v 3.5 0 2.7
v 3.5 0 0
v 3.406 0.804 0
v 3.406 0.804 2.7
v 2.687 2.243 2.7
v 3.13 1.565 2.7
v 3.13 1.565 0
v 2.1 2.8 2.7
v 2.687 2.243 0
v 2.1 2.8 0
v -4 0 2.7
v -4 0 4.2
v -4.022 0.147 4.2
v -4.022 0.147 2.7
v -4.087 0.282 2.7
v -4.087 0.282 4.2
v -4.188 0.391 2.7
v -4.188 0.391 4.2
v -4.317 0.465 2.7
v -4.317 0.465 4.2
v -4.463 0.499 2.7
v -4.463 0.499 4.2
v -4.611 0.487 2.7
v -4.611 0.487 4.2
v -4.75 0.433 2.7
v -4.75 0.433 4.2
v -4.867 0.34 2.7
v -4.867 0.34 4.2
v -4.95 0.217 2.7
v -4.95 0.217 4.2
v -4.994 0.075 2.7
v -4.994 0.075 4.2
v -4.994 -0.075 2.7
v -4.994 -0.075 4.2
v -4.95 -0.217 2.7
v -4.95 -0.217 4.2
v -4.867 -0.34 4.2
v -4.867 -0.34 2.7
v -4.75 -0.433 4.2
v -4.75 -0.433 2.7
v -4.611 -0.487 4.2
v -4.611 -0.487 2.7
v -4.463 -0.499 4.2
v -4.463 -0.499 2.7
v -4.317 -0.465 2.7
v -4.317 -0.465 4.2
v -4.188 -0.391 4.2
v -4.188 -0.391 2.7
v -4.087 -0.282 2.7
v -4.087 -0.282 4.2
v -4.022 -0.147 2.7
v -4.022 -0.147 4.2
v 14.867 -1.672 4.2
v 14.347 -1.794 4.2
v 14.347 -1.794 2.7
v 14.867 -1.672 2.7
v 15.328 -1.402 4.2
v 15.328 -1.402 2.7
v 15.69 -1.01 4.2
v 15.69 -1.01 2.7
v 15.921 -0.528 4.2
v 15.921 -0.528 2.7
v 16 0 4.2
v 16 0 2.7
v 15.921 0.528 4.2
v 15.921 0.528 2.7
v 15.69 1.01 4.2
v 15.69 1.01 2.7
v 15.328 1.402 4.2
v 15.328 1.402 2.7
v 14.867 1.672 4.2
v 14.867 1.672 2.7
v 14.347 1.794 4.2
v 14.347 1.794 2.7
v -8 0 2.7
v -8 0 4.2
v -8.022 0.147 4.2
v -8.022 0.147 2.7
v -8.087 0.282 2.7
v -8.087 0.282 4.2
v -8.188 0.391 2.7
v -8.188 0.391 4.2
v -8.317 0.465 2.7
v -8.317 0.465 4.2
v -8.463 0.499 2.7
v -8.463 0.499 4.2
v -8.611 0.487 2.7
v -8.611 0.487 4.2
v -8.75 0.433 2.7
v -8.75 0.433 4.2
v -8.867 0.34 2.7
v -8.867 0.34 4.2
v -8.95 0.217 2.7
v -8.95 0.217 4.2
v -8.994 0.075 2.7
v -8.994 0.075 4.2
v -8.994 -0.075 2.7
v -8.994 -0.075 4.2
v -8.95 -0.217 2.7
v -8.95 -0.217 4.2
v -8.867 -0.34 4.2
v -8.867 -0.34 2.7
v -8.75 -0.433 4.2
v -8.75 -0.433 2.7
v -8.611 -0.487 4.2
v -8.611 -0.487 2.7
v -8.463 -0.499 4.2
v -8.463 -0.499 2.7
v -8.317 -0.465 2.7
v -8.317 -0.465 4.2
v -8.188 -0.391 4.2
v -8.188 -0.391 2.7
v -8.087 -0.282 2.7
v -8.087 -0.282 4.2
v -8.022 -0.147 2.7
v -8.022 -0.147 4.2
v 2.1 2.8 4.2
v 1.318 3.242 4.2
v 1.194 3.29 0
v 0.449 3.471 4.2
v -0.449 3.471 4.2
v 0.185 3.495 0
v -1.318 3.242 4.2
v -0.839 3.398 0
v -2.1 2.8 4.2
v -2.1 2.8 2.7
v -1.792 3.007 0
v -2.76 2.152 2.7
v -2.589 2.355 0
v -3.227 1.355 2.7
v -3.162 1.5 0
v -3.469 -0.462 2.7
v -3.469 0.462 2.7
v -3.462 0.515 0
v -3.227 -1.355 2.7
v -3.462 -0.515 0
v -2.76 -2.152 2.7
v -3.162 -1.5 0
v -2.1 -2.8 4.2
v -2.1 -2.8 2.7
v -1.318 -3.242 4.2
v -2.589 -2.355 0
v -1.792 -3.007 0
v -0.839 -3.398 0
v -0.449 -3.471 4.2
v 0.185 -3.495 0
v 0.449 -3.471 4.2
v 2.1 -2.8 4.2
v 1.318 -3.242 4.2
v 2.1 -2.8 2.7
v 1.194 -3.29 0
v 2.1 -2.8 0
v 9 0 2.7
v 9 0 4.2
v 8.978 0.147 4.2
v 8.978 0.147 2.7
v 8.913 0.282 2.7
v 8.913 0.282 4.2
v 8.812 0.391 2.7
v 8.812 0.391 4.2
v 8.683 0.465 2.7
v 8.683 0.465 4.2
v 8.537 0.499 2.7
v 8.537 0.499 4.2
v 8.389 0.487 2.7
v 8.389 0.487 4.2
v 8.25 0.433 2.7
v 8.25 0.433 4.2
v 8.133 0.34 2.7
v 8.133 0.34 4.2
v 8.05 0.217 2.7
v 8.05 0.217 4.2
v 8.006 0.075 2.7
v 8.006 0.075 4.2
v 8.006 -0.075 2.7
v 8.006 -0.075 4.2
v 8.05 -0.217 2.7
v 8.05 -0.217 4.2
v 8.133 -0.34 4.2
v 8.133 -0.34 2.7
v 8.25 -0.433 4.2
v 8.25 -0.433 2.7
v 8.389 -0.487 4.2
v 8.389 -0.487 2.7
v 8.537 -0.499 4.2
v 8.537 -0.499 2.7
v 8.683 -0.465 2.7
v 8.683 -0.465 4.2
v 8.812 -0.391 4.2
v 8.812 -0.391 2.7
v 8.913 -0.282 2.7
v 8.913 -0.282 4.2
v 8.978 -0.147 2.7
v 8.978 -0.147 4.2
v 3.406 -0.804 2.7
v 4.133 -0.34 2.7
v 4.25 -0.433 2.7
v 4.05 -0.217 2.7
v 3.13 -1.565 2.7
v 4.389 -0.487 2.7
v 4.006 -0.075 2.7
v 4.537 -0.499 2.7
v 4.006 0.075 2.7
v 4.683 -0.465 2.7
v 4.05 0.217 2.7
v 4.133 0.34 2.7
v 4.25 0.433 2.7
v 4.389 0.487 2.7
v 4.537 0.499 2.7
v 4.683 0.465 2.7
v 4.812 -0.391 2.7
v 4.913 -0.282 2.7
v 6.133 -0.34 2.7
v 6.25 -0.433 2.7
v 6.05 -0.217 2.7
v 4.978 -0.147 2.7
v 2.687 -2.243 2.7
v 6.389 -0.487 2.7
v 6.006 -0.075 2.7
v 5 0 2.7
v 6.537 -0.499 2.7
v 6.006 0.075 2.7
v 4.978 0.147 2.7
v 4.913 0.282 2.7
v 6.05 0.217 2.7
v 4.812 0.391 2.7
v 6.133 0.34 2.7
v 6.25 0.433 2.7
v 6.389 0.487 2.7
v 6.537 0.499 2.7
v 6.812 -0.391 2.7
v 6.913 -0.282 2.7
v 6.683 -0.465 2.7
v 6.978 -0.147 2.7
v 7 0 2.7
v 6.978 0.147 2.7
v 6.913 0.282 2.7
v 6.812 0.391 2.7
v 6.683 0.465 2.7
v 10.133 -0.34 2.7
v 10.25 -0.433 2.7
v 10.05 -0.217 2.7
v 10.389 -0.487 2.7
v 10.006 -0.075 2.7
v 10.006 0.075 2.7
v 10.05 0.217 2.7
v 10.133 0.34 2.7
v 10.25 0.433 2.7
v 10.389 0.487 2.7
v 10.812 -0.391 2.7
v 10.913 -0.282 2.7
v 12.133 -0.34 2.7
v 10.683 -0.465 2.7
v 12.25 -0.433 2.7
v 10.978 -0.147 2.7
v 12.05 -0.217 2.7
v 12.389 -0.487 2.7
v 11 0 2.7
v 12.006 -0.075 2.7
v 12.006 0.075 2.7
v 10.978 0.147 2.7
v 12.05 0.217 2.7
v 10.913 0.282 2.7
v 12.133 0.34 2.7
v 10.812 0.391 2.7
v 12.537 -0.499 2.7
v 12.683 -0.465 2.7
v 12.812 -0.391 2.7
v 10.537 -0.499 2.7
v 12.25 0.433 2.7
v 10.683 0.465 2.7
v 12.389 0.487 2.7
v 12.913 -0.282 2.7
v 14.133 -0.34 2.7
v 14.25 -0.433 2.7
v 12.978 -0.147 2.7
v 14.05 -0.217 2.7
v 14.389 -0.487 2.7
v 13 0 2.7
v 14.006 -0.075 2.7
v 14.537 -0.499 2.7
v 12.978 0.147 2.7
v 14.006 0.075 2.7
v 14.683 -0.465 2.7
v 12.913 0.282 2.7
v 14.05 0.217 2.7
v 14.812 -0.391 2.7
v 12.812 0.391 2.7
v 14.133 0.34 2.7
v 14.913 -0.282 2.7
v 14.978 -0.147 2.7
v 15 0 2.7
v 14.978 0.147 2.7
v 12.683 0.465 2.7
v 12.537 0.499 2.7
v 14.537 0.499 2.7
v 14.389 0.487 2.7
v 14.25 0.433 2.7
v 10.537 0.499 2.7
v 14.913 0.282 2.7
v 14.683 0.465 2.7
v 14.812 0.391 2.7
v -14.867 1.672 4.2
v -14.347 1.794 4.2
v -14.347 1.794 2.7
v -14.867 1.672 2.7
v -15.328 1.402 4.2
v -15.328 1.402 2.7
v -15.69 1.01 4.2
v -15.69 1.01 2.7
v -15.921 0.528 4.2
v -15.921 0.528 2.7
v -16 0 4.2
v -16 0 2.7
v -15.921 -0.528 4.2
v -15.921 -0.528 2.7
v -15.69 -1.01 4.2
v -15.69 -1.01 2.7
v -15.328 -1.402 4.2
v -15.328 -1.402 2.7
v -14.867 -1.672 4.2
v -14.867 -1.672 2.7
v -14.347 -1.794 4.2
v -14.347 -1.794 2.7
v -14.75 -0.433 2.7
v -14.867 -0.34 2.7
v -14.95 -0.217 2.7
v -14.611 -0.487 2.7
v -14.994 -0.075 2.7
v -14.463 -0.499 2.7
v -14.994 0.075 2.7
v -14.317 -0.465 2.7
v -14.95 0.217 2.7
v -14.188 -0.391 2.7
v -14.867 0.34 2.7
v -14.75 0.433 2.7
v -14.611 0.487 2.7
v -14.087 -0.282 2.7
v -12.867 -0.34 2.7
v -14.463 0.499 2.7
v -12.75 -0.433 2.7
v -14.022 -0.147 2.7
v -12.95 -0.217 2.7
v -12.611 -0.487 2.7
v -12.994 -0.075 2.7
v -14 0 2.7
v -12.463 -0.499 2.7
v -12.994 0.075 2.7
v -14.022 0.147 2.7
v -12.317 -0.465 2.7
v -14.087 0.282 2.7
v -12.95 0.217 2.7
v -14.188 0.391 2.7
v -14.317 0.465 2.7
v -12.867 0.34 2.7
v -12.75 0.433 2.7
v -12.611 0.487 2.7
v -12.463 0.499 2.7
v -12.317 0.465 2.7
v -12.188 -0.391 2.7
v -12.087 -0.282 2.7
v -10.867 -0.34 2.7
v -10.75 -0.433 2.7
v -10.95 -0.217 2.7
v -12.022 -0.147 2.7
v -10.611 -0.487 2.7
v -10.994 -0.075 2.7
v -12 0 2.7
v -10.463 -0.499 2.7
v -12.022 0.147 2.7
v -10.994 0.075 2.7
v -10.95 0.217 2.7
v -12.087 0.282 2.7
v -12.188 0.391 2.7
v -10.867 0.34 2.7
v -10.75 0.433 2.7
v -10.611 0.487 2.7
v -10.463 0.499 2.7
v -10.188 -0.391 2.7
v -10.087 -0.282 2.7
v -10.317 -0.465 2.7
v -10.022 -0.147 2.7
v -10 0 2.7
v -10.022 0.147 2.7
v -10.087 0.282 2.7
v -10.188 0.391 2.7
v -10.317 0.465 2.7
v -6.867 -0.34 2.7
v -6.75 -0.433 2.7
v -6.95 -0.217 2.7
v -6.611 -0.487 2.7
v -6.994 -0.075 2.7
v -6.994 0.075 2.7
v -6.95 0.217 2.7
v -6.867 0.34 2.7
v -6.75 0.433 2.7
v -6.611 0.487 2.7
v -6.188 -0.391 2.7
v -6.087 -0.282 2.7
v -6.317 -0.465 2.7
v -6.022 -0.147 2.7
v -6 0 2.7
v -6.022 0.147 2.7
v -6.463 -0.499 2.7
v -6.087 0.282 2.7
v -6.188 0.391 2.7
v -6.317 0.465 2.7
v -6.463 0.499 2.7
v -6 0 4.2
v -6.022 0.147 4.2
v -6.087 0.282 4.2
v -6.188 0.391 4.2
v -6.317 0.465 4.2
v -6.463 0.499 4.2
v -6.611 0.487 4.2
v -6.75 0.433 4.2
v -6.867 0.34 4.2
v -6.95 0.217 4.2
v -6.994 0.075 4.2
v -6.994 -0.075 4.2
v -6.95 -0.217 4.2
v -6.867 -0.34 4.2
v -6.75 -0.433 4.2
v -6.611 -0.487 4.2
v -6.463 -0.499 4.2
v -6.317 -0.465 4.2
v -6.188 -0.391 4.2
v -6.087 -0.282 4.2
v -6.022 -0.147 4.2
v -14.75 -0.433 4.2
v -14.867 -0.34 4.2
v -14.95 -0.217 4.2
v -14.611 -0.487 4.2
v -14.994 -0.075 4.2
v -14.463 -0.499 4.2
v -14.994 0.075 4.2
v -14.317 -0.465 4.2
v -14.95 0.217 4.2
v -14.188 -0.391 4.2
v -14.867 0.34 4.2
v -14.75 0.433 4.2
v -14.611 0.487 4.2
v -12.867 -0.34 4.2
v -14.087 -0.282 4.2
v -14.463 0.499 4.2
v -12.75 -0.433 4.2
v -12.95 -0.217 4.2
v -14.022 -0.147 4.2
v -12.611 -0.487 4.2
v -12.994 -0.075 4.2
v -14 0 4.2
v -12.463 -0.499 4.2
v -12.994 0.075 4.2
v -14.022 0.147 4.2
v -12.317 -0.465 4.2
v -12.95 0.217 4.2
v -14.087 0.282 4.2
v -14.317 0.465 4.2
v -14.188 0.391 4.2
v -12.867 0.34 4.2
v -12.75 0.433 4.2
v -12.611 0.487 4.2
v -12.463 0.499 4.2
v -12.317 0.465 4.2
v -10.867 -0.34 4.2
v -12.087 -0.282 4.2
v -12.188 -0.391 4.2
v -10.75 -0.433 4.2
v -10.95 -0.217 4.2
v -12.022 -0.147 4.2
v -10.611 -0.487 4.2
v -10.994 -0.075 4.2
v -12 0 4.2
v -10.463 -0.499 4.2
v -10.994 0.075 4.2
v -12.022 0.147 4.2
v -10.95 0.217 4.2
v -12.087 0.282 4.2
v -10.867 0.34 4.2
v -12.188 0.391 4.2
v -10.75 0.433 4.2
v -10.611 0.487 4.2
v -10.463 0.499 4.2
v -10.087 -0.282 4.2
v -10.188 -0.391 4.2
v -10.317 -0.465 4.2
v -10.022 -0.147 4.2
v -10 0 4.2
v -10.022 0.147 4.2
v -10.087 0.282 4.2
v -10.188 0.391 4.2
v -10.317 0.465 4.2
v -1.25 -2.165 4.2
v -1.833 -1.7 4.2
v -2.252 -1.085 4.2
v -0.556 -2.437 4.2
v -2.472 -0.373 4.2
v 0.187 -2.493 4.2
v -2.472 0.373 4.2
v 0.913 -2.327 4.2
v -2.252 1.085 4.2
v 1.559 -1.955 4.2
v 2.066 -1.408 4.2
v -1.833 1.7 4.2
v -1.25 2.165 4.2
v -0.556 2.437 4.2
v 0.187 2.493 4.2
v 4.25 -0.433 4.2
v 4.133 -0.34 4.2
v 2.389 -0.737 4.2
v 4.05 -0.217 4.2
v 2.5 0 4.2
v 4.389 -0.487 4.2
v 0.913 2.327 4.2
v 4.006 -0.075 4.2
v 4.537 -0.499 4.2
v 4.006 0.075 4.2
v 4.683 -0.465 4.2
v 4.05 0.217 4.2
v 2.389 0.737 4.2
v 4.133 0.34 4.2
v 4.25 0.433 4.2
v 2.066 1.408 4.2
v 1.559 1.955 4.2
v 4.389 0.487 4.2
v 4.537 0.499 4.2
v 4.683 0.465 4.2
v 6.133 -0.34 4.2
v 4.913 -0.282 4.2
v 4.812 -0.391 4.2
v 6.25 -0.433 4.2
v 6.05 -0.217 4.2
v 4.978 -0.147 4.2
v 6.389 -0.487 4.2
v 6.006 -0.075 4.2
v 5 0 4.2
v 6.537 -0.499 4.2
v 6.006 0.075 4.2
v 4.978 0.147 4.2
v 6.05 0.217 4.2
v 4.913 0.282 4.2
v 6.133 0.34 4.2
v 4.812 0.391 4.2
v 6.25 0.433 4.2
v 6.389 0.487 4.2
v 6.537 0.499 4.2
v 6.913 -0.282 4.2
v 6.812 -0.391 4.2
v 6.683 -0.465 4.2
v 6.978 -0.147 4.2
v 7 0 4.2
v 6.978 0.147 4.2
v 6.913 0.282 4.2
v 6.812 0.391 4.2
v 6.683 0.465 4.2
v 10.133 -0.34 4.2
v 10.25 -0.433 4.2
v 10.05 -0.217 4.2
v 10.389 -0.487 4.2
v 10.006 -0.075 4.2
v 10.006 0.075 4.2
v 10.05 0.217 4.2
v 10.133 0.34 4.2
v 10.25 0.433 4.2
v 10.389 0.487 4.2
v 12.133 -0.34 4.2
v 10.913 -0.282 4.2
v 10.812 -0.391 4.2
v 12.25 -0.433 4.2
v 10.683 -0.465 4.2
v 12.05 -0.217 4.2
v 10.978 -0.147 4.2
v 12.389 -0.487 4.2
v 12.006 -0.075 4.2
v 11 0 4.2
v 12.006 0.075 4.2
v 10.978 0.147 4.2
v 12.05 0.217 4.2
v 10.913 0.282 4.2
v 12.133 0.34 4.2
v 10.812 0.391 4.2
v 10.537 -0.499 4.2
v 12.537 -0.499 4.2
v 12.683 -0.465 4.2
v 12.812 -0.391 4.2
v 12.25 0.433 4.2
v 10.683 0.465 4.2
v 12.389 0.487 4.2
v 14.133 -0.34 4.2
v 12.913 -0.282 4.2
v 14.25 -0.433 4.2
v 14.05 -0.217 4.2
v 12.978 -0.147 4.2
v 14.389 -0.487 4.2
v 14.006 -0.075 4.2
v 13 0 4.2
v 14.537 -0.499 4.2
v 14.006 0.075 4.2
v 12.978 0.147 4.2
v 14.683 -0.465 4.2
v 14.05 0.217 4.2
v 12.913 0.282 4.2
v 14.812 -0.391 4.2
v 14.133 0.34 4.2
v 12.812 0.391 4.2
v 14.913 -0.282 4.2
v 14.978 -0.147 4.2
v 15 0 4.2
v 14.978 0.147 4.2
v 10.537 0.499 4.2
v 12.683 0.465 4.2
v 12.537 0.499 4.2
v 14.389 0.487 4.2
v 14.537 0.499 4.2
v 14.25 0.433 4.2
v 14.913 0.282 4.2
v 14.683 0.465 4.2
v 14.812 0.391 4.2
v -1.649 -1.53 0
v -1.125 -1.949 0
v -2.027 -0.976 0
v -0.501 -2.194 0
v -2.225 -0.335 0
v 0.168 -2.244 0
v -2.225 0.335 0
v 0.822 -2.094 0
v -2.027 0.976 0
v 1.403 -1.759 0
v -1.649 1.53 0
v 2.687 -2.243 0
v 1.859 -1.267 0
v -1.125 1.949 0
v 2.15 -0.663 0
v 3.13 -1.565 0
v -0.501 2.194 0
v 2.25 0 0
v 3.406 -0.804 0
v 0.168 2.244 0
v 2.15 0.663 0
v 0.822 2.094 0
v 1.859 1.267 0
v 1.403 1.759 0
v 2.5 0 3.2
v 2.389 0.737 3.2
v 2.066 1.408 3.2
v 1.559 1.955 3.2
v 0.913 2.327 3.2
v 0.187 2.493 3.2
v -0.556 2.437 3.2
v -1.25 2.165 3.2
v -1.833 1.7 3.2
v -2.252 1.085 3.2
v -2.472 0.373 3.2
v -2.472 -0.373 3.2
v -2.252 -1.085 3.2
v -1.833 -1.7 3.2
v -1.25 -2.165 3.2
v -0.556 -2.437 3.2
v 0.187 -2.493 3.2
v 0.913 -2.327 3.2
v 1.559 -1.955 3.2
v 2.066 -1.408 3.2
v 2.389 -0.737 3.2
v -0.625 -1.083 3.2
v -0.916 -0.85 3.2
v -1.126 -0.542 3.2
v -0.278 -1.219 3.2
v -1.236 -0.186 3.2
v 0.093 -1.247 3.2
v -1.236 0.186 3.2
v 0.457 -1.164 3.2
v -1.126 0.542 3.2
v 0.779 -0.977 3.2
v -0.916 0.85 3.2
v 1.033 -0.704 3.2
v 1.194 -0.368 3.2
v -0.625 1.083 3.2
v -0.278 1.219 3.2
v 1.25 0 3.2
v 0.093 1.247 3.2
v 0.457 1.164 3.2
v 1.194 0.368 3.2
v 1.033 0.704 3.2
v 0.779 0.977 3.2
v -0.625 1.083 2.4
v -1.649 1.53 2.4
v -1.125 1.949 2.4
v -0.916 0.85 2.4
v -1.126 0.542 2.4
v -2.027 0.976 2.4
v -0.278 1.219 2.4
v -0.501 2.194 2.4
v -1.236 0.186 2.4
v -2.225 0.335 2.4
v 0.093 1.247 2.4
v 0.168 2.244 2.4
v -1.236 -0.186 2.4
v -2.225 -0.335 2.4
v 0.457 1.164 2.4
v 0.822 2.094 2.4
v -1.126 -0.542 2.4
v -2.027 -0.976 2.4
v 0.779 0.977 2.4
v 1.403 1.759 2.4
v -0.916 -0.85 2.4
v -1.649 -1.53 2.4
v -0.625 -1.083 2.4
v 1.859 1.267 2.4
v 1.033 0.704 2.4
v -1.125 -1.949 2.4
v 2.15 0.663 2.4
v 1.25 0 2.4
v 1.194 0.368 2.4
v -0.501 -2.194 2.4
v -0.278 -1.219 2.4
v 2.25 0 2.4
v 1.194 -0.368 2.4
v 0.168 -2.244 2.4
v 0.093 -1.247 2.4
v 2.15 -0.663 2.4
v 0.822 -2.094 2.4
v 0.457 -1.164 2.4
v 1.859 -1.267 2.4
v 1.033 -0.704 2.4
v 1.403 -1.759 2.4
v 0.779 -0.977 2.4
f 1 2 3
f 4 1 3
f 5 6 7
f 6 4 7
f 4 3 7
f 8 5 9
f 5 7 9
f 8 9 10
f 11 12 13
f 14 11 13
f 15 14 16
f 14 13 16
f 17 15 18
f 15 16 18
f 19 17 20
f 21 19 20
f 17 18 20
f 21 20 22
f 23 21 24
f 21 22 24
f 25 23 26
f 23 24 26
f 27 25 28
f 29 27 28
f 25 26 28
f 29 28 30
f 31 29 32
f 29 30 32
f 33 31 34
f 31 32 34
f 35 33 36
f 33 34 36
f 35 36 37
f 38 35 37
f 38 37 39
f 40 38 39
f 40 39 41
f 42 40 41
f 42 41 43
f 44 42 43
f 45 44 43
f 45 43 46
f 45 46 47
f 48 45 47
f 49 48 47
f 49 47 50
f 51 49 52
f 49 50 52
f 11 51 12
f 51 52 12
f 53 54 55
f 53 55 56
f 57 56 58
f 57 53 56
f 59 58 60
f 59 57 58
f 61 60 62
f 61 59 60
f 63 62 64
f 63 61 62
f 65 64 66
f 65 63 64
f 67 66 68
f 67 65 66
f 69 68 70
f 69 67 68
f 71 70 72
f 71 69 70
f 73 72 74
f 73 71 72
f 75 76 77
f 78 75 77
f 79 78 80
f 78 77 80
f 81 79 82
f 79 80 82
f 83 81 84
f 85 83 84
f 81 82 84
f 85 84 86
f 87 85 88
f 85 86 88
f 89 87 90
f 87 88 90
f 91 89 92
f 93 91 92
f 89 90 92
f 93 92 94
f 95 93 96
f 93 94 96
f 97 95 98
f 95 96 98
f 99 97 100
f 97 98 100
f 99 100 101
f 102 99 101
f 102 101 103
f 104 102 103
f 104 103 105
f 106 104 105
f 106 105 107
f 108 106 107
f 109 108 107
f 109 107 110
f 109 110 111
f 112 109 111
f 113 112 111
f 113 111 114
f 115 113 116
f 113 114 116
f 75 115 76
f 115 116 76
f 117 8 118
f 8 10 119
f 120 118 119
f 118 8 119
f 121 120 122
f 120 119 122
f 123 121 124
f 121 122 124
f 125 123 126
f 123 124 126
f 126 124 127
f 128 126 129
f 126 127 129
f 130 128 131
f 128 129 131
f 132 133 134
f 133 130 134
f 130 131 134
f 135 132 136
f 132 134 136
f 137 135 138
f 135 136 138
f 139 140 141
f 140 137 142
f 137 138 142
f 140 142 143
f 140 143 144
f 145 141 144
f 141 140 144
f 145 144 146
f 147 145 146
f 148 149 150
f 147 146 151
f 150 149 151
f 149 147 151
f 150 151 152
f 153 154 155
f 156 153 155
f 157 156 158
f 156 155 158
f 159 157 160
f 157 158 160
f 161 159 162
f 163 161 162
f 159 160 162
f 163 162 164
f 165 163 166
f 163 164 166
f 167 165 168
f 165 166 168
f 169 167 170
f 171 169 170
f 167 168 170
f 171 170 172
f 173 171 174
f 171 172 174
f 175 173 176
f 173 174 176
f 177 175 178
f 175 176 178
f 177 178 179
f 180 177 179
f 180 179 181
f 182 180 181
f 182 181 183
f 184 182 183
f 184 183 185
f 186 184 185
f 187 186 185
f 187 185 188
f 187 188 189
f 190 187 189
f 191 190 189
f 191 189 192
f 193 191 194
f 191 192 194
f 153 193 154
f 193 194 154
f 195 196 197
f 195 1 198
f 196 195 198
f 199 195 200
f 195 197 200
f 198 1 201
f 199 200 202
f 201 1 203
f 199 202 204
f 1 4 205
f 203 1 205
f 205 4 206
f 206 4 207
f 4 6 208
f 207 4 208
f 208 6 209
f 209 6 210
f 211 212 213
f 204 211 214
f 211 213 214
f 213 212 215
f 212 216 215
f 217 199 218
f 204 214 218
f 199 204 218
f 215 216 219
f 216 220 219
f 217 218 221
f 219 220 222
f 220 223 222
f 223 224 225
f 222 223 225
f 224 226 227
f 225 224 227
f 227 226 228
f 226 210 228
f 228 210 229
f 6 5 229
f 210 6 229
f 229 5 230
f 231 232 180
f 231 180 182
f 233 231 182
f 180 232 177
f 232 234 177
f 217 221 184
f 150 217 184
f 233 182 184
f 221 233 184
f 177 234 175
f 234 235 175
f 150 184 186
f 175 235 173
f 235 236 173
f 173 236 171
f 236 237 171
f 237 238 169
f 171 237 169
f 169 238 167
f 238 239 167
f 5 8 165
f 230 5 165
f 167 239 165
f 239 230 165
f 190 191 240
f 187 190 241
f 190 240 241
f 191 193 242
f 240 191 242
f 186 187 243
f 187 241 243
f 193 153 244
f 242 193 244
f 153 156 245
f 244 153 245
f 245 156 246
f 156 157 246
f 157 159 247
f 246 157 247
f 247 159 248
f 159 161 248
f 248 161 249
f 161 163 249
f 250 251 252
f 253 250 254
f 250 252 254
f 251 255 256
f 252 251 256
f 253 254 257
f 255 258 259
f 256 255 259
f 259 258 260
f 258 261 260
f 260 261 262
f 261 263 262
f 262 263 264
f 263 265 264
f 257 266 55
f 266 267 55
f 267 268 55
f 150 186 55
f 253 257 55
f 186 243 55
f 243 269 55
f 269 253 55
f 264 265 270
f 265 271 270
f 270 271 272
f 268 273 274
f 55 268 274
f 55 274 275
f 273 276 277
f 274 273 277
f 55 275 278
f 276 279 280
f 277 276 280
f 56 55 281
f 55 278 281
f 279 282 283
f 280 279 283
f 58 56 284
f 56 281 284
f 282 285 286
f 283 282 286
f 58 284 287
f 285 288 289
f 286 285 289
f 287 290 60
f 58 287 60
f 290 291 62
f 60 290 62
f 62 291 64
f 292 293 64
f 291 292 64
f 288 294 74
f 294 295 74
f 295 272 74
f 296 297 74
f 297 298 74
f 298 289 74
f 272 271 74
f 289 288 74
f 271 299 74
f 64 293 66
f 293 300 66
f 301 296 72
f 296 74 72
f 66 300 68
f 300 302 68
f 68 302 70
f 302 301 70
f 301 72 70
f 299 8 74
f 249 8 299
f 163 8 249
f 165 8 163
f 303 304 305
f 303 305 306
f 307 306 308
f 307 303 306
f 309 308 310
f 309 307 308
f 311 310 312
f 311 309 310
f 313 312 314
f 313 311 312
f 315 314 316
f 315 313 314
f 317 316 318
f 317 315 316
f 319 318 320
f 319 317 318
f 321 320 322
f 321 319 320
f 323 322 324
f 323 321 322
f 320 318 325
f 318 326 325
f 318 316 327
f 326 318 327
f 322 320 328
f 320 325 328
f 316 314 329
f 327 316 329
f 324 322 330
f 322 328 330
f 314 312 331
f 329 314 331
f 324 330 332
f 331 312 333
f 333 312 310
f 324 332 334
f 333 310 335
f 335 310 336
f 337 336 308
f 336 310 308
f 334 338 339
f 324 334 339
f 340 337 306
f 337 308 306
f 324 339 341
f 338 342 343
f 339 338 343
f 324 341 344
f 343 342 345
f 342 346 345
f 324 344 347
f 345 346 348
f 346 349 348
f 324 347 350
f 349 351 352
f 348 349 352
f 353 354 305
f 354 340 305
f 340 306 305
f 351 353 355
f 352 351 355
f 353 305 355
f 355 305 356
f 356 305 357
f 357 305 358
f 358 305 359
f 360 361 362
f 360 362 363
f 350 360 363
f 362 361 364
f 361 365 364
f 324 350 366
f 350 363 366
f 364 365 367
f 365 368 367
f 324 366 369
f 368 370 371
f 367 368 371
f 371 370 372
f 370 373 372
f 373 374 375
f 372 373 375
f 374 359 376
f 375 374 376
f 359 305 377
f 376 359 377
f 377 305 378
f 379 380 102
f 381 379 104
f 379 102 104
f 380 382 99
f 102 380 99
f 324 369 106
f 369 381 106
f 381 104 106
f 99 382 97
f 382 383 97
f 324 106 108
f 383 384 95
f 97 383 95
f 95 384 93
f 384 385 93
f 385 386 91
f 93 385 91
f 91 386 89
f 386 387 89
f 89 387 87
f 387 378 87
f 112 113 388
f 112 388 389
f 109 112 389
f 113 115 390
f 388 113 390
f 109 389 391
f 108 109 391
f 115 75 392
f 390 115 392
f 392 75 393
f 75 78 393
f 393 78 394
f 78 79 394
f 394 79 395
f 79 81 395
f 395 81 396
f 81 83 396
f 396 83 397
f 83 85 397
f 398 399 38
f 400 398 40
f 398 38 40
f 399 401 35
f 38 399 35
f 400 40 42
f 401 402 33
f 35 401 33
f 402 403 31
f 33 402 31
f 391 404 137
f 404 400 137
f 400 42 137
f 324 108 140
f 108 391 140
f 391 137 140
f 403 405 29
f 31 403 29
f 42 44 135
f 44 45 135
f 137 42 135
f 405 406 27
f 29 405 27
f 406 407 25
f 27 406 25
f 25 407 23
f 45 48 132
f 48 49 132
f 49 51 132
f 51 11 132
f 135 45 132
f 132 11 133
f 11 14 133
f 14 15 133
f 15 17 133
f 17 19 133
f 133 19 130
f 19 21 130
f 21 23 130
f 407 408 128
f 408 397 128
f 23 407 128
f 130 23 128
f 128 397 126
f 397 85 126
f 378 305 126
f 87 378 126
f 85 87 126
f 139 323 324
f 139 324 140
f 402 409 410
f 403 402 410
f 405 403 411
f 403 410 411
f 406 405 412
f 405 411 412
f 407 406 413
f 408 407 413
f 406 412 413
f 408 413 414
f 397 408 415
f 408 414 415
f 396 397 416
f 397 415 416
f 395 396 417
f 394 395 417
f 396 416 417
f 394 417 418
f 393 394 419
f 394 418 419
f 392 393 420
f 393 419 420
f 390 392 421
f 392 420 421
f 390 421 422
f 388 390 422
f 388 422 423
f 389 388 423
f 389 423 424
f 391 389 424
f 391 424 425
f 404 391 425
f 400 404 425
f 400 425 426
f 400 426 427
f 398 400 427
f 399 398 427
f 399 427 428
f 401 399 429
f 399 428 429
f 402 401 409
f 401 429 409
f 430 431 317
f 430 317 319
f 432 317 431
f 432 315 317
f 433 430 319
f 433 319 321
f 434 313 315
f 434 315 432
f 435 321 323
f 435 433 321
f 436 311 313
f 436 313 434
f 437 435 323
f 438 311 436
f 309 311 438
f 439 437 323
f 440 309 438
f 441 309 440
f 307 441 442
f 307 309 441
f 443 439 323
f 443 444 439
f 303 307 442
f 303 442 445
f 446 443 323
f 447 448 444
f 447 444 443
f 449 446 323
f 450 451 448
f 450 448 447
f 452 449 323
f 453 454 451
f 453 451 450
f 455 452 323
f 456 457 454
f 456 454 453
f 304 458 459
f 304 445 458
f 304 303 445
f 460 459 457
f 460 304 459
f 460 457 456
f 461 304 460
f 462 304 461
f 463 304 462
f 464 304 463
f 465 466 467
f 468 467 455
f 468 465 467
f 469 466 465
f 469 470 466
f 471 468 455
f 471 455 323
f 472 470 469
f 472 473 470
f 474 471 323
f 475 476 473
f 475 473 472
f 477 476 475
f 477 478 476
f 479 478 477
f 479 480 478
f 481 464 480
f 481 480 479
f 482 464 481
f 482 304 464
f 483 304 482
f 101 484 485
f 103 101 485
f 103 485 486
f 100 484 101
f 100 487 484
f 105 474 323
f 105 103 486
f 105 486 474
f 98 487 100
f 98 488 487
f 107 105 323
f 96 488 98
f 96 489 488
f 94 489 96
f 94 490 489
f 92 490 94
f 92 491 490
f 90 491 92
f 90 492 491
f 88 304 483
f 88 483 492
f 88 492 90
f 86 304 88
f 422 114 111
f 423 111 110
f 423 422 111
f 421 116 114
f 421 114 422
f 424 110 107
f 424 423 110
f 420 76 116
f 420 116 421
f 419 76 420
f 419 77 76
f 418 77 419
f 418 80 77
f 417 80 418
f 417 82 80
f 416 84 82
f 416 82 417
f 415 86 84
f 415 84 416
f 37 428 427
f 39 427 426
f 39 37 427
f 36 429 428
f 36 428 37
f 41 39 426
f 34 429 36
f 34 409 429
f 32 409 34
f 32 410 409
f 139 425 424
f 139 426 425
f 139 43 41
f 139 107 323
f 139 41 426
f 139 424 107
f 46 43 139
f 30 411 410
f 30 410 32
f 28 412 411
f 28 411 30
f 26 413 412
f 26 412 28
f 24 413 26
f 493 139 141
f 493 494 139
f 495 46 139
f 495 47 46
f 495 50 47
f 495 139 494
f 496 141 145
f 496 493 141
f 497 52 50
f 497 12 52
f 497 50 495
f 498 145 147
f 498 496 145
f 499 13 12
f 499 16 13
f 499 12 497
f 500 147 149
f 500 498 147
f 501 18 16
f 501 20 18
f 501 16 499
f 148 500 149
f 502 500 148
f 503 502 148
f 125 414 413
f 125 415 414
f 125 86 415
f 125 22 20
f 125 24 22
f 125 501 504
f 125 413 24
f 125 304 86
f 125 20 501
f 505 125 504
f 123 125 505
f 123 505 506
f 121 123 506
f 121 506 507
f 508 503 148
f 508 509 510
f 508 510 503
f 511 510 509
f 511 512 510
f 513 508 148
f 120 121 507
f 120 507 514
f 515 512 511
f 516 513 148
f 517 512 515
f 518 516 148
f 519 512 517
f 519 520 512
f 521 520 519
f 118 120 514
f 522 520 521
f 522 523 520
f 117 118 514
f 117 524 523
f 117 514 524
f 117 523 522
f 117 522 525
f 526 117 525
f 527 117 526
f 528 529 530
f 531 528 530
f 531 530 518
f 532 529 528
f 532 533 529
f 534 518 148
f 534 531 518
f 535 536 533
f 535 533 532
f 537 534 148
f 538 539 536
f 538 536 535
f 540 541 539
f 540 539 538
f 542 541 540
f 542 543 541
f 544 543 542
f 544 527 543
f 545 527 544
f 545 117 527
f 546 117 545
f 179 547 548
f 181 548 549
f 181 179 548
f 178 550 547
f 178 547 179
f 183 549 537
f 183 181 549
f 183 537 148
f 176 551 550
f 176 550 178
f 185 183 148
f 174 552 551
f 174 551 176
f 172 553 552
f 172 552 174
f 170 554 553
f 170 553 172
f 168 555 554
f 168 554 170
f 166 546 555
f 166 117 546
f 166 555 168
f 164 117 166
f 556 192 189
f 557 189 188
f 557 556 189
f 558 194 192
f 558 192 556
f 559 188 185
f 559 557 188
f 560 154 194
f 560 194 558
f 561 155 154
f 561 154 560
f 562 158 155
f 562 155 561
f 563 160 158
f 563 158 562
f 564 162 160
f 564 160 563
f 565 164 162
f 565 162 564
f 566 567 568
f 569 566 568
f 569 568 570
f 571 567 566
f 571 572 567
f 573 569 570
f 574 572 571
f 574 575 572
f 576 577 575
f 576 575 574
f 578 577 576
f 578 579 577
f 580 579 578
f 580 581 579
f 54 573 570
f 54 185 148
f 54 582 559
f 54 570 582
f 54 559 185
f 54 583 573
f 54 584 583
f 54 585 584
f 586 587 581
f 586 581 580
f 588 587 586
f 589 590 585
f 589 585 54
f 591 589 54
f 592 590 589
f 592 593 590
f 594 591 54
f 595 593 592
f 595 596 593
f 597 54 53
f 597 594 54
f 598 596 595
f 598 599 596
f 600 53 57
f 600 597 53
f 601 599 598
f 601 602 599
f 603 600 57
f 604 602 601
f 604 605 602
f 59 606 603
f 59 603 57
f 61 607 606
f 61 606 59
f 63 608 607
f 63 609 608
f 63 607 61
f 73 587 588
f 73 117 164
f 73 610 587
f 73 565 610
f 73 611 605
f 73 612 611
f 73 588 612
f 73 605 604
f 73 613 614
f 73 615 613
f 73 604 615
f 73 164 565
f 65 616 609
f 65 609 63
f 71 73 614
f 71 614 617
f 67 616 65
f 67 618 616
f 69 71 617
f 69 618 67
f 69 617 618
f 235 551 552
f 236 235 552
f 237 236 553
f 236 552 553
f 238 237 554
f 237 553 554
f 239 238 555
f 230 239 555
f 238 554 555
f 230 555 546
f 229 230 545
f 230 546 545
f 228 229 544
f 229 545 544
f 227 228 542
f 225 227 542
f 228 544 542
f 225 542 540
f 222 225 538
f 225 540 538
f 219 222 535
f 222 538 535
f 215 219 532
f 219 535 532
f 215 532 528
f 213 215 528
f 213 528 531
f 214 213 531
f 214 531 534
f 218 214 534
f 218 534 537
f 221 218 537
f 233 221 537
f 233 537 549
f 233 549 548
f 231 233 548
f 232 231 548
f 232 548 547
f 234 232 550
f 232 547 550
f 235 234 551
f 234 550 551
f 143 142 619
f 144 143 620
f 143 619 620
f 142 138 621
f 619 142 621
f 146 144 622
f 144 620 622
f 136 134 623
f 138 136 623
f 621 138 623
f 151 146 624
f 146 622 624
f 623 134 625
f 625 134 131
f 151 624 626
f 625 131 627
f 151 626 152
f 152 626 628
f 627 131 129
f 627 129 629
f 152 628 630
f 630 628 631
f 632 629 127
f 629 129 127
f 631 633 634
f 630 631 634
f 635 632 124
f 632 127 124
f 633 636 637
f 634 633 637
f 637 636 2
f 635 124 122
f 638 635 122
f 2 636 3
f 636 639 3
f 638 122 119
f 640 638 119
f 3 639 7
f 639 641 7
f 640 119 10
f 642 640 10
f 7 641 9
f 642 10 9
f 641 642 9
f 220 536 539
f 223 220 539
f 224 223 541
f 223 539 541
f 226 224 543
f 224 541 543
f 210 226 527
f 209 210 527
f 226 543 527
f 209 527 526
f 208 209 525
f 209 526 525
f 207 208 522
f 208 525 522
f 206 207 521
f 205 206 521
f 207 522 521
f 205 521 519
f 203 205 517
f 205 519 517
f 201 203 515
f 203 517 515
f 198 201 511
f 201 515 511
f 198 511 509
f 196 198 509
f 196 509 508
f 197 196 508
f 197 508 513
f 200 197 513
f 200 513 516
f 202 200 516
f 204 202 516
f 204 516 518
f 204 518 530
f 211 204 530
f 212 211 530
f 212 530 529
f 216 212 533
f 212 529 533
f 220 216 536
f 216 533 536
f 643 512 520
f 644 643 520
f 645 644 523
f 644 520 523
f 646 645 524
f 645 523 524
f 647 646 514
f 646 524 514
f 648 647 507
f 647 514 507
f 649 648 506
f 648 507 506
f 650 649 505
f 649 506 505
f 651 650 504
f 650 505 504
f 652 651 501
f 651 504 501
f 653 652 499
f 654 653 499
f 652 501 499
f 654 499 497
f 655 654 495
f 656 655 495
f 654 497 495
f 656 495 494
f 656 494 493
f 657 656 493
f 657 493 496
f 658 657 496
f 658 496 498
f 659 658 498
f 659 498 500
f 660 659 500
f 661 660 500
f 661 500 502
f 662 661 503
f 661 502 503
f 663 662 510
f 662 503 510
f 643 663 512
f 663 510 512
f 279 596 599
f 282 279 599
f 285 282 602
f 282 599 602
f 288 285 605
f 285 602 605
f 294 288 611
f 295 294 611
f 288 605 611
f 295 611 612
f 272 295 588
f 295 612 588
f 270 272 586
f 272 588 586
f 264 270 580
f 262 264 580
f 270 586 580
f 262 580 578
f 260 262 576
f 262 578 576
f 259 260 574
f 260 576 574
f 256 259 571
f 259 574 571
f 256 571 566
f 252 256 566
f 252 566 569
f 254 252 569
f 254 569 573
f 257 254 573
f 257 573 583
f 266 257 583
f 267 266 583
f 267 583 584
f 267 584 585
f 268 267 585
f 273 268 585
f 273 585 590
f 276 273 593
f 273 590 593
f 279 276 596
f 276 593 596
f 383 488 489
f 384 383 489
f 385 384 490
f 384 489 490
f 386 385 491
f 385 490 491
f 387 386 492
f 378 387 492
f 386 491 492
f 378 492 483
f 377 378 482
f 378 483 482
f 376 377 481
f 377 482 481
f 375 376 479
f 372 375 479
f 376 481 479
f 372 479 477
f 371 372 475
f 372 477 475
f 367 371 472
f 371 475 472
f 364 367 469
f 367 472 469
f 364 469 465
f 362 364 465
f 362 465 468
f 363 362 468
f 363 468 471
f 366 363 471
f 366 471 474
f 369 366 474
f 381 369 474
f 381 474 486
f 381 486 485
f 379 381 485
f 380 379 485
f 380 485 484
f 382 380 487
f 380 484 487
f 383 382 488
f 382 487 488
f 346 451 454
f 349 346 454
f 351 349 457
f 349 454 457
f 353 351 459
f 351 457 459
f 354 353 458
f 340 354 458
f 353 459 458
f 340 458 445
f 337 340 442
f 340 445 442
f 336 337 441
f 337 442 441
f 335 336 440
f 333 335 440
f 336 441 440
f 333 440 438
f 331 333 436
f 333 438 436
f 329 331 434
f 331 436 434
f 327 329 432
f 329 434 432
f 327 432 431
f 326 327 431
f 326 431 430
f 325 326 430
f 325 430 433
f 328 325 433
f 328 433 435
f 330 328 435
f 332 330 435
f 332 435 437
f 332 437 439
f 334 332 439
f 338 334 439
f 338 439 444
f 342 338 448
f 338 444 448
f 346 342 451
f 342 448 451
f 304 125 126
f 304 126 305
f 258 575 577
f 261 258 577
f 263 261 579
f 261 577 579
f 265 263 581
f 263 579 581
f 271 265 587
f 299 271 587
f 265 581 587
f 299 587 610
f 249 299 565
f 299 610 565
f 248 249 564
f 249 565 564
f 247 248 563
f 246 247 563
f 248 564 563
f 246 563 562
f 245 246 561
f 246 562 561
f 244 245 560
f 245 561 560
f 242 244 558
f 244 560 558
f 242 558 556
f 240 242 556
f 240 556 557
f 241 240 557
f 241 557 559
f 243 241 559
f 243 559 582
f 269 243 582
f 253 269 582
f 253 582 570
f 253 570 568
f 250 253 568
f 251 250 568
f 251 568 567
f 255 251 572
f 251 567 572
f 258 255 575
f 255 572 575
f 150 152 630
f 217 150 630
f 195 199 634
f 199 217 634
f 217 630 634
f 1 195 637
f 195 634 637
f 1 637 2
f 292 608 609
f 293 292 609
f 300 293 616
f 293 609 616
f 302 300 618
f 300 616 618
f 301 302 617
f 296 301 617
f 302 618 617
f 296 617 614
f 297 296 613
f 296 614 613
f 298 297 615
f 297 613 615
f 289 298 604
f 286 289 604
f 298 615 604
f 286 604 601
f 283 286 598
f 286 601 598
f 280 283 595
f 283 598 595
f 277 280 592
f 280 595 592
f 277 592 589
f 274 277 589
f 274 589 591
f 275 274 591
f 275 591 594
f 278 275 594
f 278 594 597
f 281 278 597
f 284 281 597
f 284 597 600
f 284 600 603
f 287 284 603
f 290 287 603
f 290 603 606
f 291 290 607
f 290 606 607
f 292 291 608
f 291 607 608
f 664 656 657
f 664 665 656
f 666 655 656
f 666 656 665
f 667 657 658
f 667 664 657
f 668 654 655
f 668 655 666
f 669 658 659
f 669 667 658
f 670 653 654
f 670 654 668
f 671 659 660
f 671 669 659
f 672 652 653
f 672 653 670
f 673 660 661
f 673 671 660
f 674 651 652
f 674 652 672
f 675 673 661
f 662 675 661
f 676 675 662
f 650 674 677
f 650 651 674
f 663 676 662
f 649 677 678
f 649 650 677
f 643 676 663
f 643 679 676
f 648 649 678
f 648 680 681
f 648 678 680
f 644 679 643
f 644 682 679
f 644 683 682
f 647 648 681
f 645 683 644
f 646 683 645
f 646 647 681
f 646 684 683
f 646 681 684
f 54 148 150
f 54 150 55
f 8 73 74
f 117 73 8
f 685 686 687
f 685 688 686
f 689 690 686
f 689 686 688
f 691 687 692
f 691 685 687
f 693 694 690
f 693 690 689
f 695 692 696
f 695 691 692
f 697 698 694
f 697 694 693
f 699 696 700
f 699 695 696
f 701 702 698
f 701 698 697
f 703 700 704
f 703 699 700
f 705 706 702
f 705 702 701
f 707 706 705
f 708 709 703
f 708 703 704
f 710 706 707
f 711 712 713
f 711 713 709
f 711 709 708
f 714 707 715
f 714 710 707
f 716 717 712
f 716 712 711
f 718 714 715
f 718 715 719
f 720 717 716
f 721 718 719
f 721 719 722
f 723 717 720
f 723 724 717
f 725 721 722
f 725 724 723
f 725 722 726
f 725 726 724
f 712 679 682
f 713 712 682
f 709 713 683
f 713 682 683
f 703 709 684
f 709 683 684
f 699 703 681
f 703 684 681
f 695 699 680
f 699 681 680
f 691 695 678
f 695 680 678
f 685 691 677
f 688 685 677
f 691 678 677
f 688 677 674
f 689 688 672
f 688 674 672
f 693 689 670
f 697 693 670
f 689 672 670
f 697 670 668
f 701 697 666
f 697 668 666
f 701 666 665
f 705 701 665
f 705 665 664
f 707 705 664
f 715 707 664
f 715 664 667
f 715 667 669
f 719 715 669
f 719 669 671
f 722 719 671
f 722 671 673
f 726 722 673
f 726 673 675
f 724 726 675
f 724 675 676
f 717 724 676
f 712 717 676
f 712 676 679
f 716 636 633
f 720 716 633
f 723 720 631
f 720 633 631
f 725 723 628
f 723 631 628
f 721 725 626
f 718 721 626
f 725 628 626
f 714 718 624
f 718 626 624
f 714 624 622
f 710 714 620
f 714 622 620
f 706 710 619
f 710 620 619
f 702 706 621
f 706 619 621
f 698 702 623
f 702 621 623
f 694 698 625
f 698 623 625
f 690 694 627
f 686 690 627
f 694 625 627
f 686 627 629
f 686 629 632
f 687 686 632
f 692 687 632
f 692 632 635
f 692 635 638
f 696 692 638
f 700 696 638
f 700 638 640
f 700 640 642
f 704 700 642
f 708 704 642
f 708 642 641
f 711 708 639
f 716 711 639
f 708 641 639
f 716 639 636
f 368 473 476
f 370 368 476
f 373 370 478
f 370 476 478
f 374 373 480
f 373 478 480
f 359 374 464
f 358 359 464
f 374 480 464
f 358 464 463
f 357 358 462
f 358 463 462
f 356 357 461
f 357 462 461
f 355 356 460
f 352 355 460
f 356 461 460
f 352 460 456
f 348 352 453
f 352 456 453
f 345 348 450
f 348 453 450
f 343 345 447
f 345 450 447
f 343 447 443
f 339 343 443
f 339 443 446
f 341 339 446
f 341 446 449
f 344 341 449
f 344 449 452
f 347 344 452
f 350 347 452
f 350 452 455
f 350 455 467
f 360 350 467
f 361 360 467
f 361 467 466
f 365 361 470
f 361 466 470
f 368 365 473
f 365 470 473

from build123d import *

# Parameters (mm, degrees)
F1_DEPTH = 4.2
F2_R     = 0.5
F3_DEPTH = 1.5
F4_R     = 2.5
F5_DEPTH = 1
F6_R     = 2.25
F7_DEPTH = 2.4
F8_R     = 1.25
F9_DEPTH = 25


with BuildPart() as f1:
    # F0 (on Top) → F1 (new body)
    with BuildSketch(Plane.XY):
        with BuildLine():
            ThreePointArc((2.1, -2.8), (3.130495, -1.565248), (3.5, 0))
            ThreePointArc((3.5, 0), (3.130495, 1.565248), (2.1, 2.8))
            ThreePointArc((2.1, 2.8), (0, 3.5), (-2.1, 2.8))
            ThreePointArc((-2.1, 2.8), (-3.5, 0), (-2.1, -2.8))
            ThreePointArc((-2.1, -2.8), (0, -3.5), (2.1, -2.8))
        make_face()
    extrude(amount=F1_DEPTH)

    # F2 (on face) → F3 (join)
    with BuildSketch(Plane.XY.offset(4.2)):
        with BuildLine():
            Line((-2.1, 2.8), (-14.347362, 1.793958))
            ThreePointArc((-14.347362, 1.793958), (-16, 0), (-14.347362, -1.793958))
            Line((-14.347362, -1.793958), (-2.1, -2.8))
            ThreePointArc((-2.1, -2.8), (-3.5, 0), (-2.1, 2.8))
        make_face()
        with Locations((-14.5, 0)):
            Circle(F2_R, mode=Mode.SUBTRACT)
        with Locations((-12.5, 0)):
            Circle(F2_R, mode=Mode.SUBTRACT)
        with Locations((-10.5, 0)):
            Circle(F2_R, mode=Mode.SUBTRACT)
        with Locations((-8.5, 0)):
            Circle(F2_R, mode=Mode.SUBTRACT)
        with Locations((-6.5, 0)):
            Circle(F2_R, mode=Mode.SUBTRACT)
        with Locations((-4.5, 0)):
            Circle(F2_R, mode=Mode.SUBTRACT)
        with BuildLine():
            Line((2.1, -2.8), (14.347362, -1.793958))
            ThreePointArc((14.347362, -1.793958), (16, 0), (14.347362, 1.793958))
            Line((14.347362, 1.793958), (2.1, 2.8))
            ThreePointArc((2.1, 2.8), (3.5, 0), (2.1, -2.8))
        make_face()
        with Locations((4.5, 0)):
            Circle(F2_R, mode=Mode.SUBTRACT)
        with Locations((6.5, 0)):
            Circle(F2_R, mode=Mode.SUBTRACT)
        with Locations((8.5, 0)):
            Circle(F2_R, mode=Mode.SUBTRACT)
        with Locations((10.5, 0)):
            Circle(F2_R, mode=Mode.SUBTRACT)
        with Locations((12.5, 0)):
            Circle(F2_R, mode=Mode.SUBTRACT)
        with Locations((14.5, 0)):
            Circle(F2_R, mode=Mode.SUBTRACT)
    extrude(amount=-F3_DEPTH)

    # F4 (on face) → F5 (cut)
    with BuildSketch(Plane.XY.offset(4.2)):
        Circle(F4_R)
    extrude(amount=-F5_DEPTH, mode=Mode.SUBTRACT)

    # F6 (on face) → F7 (cut)
    with BuildSketch(Plane(origin=(0, 0, 0), x_dir=(1, 0, 0), z_dir=(0, 0, -1))):
        Circle(F6_R)
    extrude(amount=-F7_DEPTH, mode=Mode.SUBTRACT)

    # F8 (on face) → F9 (cut)
    with BuildSketch(Plane.XY.offset(3.2)):
        Circle(F8_R)
    extrude(amount=-F9_DEPTH, mode=Mode.SUBTRACT)


solid = f1.part
